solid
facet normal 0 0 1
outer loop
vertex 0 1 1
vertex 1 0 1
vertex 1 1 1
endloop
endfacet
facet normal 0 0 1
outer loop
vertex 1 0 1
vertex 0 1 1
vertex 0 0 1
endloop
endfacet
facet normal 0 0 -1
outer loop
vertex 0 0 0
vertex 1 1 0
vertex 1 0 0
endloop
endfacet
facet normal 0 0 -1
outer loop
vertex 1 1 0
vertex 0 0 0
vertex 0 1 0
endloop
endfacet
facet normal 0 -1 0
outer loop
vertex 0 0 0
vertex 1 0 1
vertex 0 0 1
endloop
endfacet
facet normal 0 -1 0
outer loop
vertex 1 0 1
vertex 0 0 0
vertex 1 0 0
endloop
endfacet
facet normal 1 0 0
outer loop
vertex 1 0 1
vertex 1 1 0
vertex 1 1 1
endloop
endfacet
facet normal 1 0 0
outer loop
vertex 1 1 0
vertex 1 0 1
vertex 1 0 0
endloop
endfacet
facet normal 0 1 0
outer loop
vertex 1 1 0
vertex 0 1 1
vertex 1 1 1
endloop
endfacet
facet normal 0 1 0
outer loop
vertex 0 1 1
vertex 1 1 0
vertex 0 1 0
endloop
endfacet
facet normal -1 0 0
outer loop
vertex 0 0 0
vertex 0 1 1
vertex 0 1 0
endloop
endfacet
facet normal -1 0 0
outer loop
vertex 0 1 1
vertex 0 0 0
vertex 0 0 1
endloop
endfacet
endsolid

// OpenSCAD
// file: ../../modules/module_rounded_text.scad
// Creates a line of text that goes around a circle, with each character extruded along the circle's surface,
// Tries to space the chars based on the the character width.

// takes part of an array
function getRunningTextWidth(charsMetrics,position=0,end) = //= [for (i = [start:end]) list[i]];
  assert(is_list(charsMetrics), "charsMetrics must be a list")
  assert(is_num(position), str("position must be a number", "provided '", position, "'"))
  assert(is_num(end), str("end must be a number", "provided '", end, "'"))
  position < end
    ? charsMetrics[position].size.y + getRunningTextWidth(charsMetrics, position + 1, end)
    : charsMetrics[position].size.y;

function subStr(s,length=5) =
  assert(is_string(s), "s must be a string")
  assert(is_num(length), "length must be a number")
  str(chr([for(i=[0 :min(length,len(s))-1])ord(s[i])]));

module RoundText(
  text = "",
  font = "Liberation:style=Bold",
  fontSize = 6.5,
  radius = 20,
  textExtrude = 1,
  forceRound = false,
  center = true,
  $fn=64)
{
  _radius = forceRound ? radius - textExtrude : radius;
  charsCount = len(text);
  charsMetrics = [for(i=[0:1:charsCount-1]) textmetrics(text=str(text[i]),size=fontSize,font=font)];


  offsetAngle = center ? textmetrics(text=text,size=fontSize,font=font).size.x/2 : 0;

  // takes part of an array
  rotate([0,0,-offsetAngle*180/(PI*_radius)])
  intersection(){
    union(){
      for(i=[0:1:charsCount-1]){
        char = text[i];

        runningMetrix = textmetrics(text=subStr(text, i+1),size=fontSize,font=font);
        runningLength = runningMetrix.size.x - charsMetrics[i].size.x/2;
        arcAngle=runningLength*180/(PI*_radius);
        rotate([0,0,arcAngle])
          translate( [_radius,0,0])
            rotate([90,0,90])
              linear_extrude(textExtrude * (forceRound ? 2:1))
                text(
                  text[i],
                  //valign="center",
                  halign="center",
                  size=fontSize,
                  font=font);
        }
    }
    if(forceRound)
    {
      translate([0,0,-fontSize])
      difference(){
        cylinder(r=radius+textExtrude,h = fontSize*3,$fn=$fn);
        translate([0,0,-fudgeFactor])
        cylinder(r=radius,h = fontSize*3+fudgeFactor*2,$fn=$fn);
      }
    }
  }
}
// file: ../../modules/modules_utility.scad
include <constants.scad>
include <module_rounded_text.scad>
include <thirdparty/ostat/rounded_shapes.scad>

// rotate as per a, v, but around point pt
module rotate_about_pt(z, y, pt) {
    translate(pt)
        rotate([0, y, z]) // CHANGE HERE
            translate(-pt)
                children();
}
// file: ../../modules/constants.scad
fudgeFactor = 0.015;

//Connector array settings
iSettingsLength = 0;
iSettingsMeasurement = 1;
iSettingsDiameter = 2;
iSettingsWallThickness = 3;
iSettingsTaper = 4;
iSettingsVersion = 5;

DefaultEnd1Color = "LightPink";
DefaultEnd1ExtensionColor = "HotPink";

DefaultEnd2Color = "SkyBlue";
DefaultEnd2ExtensionColor = "DeepSkyBlue";

DefaultEnd3Color = "MediumPurple";
DefaultEnd3ExtensionColor = "DarkOrchid";

DefaultTransitionColor = "LightGreen";
DefaultExtensionColor = "purple";
// main file
include <../../modules/connectors/connector_oneida.scad>

epsilon = 0.0001;

function approx(a, b, tolerance = epsilon) = abs(a - b) <= tolerance;

supportedNominalInch = [3,4,5,6,7,8,9,10,11,12,14,16,18];
supportedNominalMm = [76.2,101.6,127,152.4,177.8,203.2,228.6,254,279.4,304.8,355.6,406.4,457.2];

assert(oneidaQuickClampSupportedNominalsInch() == supportedNominalInch);
supportedNominalMmActual = oneidaQuickClampSupportedNominalDiameters();
assert(len(supportedNominalMmActual) == len(supportedNominalMm));
for (i = [0 : len(supportedNominalMm) - 1]) {
  assert(approx(supportedNominalMmActual[i], supportedNominalMm[i]));
  dimensions = oneidaQuickClampDimensions(supportedNominalMm[i], 2.4, 0);
  assert(approx(dimensions[iOneidaDimensionBeadOuterDiameter], supportedNominalMm[i] + 9));
  assert(approx(dimensions[iOneidaDimensionNeckOuterDiameter], supportedNominalMm[i] - 4));
  assert(approx((dimensions[iOneidaDimensionBeadOuterDiameter] - dimensions[iOneidaDimensionBeadInnerDiameter]) / 2, 5.58));
}

dimsFiveInch = oneidaQuickClampDimensions(nominalDiameter = 5 * 25.4, wallThickness = 2.4, fitAdjustment = 0);
dimsFiveMetric = oneidaQuickClampDimensions(nominalDiameter = 127, wallThickness = 2.4, fitAdjustment = 0);
dimsSixInch = oneidaQuickClampDimensions(nominalDiameter = 6 * 25.4, wallThickness = 2.4, fitAdjustment = 0);

assert(dimsFiveInch == dimsFiveMetric);
assert(approx(dimsFiveMetric[iOneidaDimensionNominal], 127));
assert(approx(dimsFiveMetric[iOneidaDimensionBeadOuterDiameter], 136));
assert(approx(dimsFiveMetric[iOneidaDimensionBeadInnerDiameter], 124.84));
assert(approx(dimsFiveMetric[iOneidaDimensionNeckOuterDiameter], 123));
assert(approx(dimsFiveMetric[iOneidaDimensionNeckInnerDiameter], 118.2));

assert(approx(dimsSixInch[iOneidaDimensionNominal], 152.4));
assert(approx(dimsSixInch[iOneidaDimensionBeadOuterDiameter], 161.4));
assert(approx(dimsSixInch[iOneidaDimensionNeckOuterDiameter], 148.4));
assert(approx(dimsSixInch[iOneidaDimensionBeadOuterDiameter] - dimsSixInch[iOneidaDimensionNominal], 9));
assert(approx(dimsSixInch[iOneidaDimensionNeckOuterDiameter] - dimsSixInch[iOneidaDimensionNominal], -4));

dimsFiveFitPlus = oneidaQuickClampDimensions(nominalDiameter = 127, wallThickness = 2.4, fitAdjustment = 0.5);
dimsFiveFitMinus = oneidaQuickClampDimensions(nominalDiameter = 127, wallThickness = 2.4, fitAdjustment = -0.5);

assert(approx(dimsFiveFitPlus[iOneidaDimensionNominal], dimsFiveMetric[iOneidaDimensionNominal]));
assert(approx(dimsFiveFitPlus[iOneidaDimensionBeadOuterDiameter] - dimsFiveMetric[iOneidaDimensionBeadOuterDiameter], 0.5));
assert(approx(dimsFiveFitPlus[iOneidaDimensionBeadInnerDiameter] - dimsFiveMetric[iOneidaDimensionBeadInnerDiameter], 0.5));
assert(approx(dimsFiveFitPlus[iOneidaDimensionNeckOuterDiameter] - dimsFiveMetric[iOneidaDimensionNeckOuterDiameter], 0.5));
assert(approx(dimsFiveFitPlus[iOneidaDimensionNeckInnerDiameter] - dimsFiveMetric[iOneidaDimensionNeckInnerDiameter], 0.5));

assert(approx(dimsFiveFitMinus[iOneidaDimensionNominal], dimsFiveMetric[iOneidaDimensionNominal]));
assert(approx(dimsFiveMetric[iOneidaDimensionBeadOuterDiameter] - dimsFiveFitMinus[iOneidaDimensionBeadOuterDiameter], 0.5));
assert(approx(dimsFiveMetric[iOneidaDimensionBeadInnerDiameter] - dimsFiveFitMinus[iOneidaDimensionBeadInnerDiameter], 0.5));
assert(approx(dimsFiveMetric[iOneidaDimensionNeckOuterDiameter] - dimsFiveFitMinus[iOneidaDimensionNeckOuterDiameter], 0.5));
assert(approx(dimsFiveMetric[iOneidaDimensionNeckInnerDiameter] - dimsFiveFitMinus[iOneidaDimensionNeckInnerDiameter], 0.5));

minimumLengthWall24 = oneidaQuickClampMinimumLength(wallThickness = 2.4);
minimumLengthWall4 = oneidaQuickClampMinimumLength(wallThickness = 4);
assert(approx(minimumLengthWall24, 7.98));
assert(approx(minimumLengthWall4, 9.58));
assert(approx(minimumLengthWall24 - 2.4, 5.58));
assert(approx(minimumLengthWall4 - 4, 5.58));

cube([1,1,1]);
